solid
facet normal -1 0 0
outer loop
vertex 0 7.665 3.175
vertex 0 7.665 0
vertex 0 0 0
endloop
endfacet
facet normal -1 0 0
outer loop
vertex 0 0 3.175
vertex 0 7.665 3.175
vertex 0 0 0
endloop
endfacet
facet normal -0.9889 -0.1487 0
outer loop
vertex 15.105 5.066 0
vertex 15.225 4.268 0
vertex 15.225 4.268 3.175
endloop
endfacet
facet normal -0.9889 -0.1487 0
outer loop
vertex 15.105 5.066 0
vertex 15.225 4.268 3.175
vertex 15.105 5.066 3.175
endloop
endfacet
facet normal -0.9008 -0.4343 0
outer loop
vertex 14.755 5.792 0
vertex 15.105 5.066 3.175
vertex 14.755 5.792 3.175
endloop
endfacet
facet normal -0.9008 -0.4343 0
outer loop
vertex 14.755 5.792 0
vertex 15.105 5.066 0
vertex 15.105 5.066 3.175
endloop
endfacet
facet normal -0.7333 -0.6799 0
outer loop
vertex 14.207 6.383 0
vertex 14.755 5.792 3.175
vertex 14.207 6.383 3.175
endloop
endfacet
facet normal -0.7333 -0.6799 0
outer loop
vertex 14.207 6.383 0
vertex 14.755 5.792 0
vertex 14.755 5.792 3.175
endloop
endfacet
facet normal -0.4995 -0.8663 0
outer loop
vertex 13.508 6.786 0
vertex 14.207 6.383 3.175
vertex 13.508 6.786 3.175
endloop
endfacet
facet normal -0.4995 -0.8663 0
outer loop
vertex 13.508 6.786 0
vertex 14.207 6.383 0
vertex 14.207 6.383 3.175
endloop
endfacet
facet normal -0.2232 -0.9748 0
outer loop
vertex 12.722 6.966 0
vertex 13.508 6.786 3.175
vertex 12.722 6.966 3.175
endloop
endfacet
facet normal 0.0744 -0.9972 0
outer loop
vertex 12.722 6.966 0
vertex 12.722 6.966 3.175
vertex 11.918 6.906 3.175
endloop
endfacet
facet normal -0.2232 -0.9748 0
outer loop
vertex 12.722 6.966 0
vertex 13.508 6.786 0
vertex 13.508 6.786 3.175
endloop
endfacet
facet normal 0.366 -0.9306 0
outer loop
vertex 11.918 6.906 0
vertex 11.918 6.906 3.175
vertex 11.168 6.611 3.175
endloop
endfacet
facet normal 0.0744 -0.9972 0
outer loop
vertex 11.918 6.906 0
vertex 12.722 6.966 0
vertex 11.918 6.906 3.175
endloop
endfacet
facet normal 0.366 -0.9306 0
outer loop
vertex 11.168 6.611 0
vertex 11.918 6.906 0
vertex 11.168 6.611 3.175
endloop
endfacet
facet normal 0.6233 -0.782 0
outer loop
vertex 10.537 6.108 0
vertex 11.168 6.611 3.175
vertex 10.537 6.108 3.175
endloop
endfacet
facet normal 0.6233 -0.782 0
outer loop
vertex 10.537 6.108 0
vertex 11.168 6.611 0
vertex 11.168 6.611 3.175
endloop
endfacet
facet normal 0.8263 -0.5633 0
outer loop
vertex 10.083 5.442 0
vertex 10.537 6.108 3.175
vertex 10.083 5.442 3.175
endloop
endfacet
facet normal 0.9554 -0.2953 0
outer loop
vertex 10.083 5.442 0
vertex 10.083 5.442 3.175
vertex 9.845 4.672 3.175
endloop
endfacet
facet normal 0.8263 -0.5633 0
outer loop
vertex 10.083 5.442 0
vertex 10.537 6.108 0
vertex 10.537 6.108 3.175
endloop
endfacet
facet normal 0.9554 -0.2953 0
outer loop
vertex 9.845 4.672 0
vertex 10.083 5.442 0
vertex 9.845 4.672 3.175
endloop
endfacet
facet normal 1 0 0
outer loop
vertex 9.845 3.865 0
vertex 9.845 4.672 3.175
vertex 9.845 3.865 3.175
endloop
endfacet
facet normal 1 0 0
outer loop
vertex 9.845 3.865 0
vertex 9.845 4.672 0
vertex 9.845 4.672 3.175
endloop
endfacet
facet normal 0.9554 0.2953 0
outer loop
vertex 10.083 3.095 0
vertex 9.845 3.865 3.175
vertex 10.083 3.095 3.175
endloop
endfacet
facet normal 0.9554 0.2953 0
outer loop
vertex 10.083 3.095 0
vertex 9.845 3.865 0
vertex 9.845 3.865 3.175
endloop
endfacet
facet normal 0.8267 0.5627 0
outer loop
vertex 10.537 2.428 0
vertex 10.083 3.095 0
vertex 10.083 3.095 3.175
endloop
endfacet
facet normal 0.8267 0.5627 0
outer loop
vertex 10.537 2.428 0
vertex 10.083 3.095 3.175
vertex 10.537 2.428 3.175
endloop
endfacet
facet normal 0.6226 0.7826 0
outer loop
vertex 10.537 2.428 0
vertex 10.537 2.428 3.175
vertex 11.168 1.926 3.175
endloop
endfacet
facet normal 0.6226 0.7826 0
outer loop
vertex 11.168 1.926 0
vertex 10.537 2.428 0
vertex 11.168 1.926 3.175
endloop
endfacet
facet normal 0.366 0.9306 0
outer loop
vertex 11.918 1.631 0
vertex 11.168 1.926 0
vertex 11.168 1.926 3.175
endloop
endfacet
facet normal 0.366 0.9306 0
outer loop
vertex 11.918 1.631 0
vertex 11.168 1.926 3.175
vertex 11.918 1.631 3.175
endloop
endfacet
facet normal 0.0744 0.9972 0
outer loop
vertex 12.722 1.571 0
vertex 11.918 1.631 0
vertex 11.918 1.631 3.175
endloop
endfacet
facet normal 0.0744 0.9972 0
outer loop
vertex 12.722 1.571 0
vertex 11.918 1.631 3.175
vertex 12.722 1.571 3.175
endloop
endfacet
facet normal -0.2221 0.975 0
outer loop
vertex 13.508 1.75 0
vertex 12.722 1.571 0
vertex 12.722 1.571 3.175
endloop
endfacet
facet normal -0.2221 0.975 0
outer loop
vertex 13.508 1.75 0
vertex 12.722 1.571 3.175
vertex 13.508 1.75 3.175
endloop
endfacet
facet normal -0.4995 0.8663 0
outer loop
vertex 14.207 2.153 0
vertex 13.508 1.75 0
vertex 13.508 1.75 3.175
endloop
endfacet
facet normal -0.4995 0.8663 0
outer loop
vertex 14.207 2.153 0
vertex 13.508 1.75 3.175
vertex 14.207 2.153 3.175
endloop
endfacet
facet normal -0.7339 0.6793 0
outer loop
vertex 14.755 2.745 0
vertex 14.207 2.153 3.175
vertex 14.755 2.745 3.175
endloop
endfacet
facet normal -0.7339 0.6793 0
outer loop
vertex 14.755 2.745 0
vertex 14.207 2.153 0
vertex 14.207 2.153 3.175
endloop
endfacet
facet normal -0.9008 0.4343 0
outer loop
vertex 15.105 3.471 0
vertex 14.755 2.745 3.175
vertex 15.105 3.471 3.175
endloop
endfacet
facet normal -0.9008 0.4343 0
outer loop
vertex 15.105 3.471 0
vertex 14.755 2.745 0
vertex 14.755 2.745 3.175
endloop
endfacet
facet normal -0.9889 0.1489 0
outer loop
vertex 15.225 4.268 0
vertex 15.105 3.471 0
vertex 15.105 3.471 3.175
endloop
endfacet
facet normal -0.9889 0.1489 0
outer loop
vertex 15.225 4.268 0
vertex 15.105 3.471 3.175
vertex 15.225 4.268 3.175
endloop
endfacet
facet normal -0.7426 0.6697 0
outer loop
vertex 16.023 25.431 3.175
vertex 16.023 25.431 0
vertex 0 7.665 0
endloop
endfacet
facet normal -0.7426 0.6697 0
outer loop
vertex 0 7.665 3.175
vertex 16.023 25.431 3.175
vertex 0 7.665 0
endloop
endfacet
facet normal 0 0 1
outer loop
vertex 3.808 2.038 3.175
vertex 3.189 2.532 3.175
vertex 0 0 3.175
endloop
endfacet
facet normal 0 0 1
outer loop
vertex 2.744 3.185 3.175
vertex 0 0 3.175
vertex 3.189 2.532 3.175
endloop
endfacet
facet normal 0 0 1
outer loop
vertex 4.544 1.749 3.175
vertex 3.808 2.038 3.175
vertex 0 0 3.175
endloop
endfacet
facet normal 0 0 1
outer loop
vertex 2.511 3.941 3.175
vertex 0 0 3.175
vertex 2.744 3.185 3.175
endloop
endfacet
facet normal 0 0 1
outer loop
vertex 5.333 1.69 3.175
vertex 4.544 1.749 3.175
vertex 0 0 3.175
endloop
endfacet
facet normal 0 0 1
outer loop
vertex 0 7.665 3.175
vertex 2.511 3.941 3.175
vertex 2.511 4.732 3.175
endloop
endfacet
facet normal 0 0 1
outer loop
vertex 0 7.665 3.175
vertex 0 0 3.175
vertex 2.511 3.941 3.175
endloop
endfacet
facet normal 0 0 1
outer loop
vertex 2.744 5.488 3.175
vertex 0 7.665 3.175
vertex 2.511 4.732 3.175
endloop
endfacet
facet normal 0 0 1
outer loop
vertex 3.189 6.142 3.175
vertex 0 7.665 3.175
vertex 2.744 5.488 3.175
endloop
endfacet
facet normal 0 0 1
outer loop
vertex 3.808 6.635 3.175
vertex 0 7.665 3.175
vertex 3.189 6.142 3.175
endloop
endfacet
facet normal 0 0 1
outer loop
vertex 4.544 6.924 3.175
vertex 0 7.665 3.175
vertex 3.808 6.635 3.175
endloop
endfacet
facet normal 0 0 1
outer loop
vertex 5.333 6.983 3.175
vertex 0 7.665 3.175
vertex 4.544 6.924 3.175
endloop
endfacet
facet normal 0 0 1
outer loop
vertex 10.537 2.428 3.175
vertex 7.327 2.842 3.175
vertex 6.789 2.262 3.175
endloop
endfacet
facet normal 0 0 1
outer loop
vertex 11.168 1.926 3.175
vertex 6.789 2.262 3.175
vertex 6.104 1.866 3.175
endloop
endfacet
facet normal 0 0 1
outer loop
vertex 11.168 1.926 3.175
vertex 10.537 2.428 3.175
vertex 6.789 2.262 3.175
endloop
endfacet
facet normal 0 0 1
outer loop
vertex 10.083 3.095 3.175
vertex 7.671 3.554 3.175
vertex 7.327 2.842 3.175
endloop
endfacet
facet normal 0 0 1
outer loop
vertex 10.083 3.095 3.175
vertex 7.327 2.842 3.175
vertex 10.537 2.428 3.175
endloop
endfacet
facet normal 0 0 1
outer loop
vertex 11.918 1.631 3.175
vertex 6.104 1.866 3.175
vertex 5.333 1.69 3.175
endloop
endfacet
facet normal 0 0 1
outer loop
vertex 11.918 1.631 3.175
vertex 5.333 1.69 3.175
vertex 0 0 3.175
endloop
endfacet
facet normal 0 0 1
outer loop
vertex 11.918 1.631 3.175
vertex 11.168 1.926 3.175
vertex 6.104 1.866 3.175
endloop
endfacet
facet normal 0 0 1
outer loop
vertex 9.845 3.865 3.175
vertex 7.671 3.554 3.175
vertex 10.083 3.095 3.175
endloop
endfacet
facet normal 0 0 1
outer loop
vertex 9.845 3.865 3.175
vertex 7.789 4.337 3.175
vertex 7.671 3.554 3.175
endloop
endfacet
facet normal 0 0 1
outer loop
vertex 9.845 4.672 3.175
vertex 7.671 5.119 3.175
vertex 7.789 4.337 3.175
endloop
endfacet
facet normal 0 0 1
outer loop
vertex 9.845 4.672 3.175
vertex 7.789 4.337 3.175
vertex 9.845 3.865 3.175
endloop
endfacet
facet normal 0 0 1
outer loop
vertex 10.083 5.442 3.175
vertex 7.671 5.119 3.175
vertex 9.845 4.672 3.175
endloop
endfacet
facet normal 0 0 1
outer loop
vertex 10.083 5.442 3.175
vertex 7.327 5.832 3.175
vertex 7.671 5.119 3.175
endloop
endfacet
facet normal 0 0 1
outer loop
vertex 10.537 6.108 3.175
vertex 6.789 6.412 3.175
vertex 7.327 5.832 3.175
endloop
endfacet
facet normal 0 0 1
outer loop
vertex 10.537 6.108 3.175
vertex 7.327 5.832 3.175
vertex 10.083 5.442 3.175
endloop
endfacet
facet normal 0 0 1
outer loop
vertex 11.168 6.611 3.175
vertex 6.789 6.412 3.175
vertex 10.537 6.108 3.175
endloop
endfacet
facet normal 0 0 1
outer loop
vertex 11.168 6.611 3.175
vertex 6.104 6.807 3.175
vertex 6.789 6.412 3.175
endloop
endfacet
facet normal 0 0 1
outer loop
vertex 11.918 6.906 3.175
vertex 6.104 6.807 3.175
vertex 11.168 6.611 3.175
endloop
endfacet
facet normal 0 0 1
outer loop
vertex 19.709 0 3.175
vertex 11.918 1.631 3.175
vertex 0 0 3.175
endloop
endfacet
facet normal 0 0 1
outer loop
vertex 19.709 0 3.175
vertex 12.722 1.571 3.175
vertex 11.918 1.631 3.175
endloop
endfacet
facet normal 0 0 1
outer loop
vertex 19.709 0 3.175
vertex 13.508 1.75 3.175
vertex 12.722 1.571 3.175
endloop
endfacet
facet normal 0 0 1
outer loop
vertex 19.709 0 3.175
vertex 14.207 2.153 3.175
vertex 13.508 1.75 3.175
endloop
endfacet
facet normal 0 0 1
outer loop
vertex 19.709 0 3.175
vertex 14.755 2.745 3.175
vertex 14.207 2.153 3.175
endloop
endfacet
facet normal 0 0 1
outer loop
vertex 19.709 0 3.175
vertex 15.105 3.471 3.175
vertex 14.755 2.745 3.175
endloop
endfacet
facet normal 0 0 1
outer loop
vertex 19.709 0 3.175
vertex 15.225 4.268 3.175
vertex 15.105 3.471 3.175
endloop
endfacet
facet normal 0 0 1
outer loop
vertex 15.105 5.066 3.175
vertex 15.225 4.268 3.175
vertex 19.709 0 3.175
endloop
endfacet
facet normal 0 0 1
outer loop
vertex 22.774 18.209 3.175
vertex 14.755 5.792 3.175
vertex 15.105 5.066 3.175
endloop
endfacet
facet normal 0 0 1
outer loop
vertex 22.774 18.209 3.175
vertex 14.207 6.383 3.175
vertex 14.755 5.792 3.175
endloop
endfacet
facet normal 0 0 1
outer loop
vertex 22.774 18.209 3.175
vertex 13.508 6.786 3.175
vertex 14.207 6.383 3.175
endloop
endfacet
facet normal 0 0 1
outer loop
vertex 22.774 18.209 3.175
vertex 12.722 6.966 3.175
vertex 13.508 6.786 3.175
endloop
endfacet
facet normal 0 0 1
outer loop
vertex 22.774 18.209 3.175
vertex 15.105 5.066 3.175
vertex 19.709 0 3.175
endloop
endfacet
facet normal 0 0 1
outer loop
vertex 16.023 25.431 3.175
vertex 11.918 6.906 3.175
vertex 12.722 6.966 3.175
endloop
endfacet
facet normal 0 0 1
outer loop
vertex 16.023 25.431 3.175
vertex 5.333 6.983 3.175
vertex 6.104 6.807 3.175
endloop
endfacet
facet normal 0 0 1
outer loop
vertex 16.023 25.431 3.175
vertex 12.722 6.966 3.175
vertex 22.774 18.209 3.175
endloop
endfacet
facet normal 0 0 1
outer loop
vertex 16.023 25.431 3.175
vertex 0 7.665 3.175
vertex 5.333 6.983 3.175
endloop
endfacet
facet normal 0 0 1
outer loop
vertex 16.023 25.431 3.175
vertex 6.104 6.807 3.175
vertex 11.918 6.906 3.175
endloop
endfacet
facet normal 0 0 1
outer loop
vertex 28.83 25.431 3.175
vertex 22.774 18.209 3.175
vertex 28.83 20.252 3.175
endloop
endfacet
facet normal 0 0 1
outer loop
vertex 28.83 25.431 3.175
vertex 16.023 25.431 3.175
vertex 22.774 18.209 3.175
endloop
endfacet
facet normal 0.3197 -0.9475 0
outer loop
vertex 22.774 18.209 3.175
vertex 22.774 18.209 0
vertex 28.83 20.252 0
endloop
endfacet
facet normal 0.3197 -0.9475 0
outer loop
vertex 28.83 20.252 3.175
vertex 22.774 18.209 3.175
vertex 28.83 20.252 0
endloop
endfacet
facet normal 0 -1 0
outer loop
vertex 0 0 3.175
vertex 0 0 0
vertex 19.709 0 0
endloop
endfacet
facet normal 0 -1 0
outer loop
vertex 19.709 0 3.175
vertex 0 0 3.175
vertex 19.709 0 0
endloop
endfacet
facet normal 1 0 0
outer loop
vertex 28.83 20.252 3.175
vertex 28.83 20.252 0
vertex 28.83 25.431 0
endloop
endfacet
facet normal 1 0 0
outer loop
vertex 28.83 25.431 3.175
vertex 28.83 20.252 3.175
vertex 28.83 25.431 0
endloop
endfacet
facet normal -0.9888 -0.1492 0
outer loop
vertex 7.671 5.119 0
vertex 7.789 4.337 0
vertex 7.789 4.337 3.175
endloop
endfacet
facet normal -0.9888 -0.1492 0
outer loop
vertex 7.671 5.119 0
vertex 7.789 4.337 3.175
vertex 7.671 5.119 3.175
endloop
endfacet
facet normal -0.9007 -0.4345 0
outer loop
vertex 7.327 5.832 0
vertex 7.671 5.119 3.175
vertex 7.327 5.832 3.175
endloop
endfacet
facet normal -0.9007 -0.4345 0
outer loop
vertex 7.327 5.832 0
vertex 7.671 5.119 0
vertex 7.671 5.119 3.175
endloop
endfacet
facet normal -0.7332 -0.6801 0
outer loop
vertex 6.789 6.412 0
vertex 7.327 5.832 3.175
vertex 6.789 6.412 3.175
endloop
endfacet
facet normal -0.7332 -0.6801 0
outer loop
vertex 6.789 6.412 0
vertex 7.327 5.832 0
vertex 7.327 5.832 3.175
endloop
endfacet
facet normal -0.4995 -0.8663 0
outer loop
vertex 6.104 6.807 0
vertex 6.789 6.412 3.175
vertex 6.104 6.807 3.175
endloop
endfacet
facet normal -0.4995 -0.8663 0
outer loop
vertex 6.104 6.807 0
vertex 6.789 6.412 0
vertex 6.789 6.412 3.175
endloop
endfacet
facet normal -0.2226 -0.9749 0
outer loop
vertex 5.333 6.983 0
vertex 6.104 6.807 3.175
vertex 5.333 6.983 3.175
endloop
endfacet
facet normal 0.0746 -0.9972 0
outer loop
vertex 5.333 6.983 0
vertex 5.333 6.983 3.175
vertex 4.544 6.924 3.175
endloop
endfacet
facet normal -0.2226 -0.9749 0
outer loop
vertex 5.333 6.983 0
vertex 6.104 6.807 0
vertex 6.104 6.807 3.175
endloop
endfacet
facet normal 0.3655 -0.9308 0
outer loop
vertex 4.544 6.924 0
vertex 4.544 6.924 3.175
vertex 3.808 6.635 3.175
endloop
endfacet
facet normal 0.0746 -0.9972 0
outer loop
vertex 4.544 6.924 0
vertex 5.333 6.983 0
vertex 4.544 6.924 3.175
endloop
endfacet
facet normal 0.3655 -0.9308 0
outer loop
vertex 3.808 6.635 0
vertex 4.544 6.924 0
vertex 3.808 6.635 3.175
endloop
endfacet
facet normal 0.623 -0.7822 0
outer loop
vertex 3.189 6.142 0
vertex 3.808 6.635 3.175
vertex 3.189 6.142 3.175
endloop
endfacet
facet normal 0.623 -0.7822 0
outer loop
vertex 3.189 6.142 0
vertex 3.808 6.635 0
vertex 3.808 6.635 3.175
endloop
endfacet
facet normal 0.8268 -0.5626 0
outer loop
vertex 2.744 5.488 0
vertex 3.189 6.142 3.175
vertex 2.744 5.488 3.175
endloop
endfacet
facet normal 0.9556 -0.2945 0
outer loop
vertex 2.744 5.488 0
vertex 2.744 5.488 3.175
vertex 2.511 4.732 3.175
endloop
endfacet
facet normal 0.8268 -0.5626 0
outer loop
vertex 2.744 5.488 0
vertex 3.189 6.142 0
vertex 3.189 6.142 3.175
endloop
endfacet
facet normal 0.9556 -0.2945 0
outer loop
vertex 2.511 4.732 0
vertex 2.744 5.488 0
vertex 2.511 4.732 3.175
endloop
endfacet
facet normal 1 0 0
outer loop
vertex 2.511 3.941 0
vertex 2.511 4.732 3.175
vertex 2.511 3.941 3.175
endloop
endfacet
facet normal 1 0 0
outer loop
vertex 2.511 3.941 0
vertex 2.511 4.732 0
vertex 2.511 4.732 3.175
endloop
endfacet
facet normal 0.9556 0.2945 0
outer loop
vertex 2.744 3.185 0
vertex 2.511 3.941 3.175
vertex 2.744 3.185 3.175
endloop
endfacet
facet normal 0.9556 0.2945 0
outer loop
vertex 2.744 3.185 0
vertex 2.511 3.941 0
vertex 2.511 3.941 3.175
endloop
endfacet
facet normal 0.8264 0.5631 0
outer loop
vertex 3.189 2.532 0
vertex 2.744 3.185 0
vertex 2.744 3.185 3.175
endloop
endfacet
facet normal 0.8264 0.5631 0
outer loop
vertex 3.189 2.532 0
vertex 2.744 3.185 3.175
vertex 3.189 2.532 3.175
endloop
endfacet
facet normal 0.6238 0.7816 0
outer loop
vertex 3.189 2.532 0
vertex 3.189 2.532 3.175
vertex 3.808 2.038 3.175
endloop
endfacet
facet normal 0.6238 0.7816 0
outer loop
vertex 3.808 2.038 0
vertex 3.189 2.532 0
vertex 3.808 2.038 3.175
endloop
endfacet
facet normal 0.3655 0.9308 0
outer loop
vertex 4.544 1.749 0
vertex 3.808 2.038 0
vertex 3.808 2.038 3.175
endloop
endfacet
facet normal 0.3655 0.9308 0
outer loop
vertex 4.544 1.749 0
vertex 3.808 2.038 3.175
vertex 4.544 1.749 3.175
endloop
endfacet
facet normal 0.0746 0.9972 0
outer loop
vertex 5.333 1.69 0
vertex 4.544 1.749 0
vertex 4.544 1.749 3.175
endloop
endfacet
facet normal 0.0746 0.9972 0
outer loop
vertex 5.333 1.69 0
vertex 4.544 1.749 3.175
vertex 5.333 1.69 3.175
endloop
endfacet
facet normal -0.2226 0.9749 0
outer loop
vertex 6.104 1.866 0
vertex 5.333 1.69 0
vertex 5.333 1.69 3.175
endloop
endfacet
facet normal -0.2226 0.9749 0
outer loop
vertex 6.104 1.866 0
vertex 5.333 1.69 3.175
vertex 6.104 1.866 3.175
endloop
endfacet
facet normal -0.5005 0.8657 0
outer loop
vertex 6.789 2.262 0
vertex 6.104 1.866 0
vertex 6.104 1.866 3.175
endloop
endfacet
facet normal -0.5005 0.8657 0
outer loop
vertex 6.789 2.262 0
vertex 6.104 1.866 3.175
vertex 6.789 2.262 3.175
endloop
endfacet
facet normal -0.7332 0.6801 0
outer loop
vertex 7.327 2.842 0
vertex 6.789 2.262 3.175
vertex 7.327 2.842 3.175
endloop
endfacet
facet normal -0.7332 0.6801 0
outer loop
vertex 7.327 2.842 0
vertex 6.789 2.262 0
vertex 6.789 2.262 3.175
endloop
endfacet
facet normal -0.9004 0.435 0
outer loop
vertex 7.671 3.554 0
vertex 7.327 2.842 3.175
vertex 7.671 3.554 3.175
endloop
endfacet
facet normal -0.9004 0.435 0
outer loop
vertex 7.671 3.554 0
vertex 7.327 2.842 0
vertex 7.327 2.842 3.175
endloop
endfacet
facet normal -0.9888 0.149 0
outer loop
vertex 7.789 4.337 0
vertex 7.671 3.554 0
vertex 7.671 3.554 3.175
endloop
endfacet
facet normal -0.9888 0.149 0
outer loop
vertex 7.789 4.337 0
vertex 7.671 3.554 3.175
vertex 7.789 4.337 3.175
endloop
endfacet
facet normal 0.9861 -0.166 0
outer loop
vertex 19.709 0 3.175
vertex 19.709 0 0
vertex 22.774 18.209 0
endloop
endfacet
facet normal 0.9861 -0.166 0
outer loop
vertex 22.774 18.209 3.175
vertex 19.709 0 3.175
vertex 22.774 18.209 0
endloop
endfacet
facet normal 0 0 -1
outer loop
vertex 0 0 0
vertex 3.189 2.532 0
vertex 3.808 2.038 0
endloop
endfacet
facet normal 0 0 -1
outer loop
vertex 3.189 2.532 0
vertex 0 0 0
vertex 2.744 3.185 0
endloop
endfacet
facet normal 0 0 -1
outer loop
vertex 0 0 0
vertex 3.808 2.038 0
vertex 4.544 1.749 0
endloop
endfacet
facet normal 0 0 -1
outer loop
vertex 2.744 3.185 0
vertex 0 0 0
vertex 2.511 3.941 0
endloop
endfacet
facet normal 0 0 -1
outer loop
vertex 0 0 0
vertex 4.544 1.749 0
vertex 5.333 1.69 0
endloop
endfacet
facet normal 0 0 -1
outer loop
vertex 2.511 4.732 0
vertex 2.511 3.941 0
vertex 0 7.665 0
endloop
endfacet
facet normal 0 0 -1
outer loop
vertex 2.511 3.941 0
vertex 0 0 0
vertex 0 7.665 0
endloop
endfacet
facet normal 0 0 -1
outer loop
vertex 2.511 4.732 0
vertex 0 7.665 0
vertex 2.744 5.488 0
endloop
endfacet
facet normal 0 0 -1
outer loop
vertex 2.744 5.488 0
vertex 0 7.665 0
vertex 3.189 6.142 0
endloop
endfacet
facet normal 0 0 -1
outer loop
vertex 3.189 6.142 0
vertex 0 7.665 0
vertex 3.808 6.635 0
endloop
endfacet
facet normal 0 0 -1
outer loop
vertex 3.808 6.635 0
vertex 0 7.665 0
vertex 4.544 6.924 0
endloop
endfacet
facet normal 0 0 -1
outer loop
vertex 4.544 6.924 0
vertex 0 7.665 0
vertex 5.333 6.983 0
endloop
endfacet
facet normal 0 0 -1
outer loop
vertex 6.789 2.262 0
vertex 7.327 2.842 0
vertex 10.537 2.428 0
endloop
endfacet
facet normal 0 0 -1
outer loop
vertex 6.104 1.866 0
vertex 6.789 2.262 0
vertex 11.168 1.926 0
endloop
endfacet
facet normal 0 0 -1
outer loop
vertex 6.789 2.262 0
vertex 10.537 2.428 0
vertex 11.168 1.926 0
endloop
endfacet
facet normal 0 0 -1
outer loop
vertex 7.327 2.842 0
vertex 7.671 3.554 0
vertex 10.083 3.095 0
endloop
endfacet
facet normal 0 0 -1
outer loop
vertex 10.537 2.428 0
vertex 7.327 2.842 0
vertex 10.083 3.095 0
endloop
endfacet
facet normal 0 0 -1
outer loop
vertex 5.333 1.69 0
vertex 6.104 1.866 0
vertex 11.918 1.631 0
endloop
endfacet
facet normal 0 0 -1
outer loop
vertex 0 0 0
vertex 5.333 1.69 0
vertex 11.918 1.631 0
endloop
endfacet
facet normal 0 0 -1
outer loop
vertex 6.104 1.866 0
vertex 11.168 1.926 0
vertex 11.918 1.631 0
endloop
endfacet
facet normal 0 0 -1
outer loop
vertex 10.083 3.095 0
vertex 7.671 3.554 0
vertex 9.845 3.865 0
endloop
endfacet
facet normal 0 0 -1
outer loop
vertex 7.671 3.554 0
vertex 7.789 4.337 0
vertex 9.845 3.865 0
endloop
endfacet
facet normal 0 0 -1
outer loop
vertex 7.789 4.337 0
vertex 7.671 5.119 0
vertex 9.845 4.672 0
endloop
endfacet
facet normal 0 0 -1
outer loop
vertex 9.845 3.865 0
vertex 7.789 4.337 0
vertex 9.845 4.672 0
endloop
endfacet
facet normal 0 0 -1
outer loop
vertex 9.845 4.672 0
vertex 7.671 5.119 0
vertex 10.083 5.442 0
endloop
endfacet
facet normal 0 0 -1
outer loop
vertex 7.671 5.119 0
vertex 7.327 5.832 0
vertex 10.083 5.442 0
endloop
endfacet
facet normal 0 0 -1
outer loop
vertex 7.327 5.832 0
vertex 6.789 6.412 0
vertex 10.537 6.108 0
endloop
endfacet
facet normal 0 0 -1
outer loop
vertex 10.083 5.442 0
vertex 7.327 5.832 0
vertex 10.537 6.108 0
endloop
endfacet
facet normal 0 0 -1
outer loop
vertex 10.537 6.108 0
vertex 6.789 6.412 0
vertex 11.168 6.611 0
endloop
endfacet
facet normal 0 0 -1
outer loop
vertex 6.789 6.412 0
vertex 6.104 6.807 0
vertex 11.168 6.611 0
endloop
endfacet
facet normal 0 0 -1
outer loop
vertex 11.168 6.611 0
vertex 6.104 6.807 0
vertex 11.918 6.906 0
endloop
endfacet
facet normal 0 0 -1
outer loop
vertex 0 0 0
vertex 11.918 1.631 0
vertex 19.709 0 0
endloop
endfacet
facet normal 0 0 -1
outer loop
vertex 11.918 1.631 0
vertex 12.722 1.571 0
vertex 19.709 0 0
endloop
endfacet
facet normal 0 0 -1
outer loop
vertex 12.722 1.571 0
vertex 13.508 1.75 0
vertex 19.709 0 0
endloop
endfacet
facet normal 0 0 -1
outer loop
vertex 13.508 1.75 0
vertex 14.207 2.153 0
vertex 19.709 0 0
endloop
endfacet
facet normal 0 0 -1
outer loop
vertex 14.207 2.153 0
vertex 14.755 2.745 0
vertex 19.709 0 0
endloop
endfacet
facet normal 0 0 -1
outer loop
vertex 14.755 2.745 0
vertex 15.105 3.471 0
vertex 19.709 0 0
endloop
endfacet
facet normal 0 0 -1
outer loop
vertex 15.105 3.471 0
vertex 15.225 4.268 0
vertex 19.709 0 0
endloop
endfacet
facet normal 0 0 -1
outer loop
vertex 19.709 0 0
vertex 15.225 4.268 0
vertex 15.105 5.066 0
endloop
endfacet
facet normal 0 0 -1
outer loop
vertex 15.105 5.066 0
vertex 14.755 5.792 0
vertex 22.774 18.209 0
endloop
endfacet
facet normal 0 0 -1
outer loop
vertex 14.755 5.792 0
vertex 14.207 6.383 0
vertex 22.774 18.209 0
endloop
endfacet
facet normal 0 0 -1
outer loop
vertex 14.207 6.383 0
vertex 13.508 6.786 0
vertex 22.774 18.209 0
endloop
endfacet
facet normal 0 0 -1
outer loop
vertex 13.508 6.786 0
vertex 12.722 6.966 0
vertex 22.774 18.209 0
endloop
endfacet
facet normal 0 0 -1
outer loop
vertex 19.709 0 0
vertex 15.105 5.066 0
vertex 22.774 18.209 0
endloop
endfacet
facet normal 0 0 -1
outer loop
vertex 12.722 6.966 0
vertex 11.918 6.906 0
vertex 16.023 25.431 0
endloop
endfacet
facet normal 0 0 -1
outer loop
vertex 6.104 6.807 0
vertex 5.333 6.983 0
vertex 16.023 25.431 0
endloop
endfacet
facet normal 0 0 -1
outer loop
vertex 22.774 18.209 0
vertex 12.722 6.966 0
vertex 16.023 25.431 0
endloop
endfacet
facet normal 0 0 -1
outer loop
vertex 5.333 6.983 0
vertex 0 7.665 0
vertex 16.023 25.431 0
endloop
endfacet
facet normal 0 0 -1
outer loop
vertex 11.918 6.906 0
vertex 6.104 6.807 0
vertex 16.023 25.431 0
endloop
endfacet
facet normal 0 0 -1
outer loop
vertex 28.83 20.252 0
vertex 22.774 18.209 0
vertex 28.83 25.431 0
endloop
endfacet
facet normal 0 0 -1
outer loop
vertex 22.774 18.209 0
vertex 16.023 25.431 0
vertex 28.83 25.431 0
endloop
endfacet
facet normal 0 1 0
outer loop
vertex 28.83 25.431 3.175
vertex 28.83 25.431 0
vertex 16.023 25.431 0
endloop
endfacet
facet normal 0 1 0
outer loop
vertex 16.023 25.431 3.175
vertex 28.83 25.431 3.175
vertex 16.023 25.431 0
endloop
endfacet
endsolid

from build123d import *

# Parameters (mm, degrees)
F0_R     = 2.65378
F0_R_2   = 2.705133
F1_DEPTH = 3.175


with BuildPart() as f1:
    # F0 (on Top) → F1 (new body)
    with BuildSketch(Plane.XY):
        Polygon((0, 7.664707), (0, 0), (19.709434, 0), (22.774175, 18.209429), (28.829604, 20.252014), (28.829604, 25.431277), (16.022975, 25.431277), align=None)
        with Locations((5.134751, 4.33671)):
            Circle(F0_R, mode=Mode.SUBTRACT)
        with Locations((12.520132, 4.268356)):
            Circle(F0_R_2, mode=Mode.SUBTRACT)
    extrude(amount=F1_DEPTH)


solid = f1.part
